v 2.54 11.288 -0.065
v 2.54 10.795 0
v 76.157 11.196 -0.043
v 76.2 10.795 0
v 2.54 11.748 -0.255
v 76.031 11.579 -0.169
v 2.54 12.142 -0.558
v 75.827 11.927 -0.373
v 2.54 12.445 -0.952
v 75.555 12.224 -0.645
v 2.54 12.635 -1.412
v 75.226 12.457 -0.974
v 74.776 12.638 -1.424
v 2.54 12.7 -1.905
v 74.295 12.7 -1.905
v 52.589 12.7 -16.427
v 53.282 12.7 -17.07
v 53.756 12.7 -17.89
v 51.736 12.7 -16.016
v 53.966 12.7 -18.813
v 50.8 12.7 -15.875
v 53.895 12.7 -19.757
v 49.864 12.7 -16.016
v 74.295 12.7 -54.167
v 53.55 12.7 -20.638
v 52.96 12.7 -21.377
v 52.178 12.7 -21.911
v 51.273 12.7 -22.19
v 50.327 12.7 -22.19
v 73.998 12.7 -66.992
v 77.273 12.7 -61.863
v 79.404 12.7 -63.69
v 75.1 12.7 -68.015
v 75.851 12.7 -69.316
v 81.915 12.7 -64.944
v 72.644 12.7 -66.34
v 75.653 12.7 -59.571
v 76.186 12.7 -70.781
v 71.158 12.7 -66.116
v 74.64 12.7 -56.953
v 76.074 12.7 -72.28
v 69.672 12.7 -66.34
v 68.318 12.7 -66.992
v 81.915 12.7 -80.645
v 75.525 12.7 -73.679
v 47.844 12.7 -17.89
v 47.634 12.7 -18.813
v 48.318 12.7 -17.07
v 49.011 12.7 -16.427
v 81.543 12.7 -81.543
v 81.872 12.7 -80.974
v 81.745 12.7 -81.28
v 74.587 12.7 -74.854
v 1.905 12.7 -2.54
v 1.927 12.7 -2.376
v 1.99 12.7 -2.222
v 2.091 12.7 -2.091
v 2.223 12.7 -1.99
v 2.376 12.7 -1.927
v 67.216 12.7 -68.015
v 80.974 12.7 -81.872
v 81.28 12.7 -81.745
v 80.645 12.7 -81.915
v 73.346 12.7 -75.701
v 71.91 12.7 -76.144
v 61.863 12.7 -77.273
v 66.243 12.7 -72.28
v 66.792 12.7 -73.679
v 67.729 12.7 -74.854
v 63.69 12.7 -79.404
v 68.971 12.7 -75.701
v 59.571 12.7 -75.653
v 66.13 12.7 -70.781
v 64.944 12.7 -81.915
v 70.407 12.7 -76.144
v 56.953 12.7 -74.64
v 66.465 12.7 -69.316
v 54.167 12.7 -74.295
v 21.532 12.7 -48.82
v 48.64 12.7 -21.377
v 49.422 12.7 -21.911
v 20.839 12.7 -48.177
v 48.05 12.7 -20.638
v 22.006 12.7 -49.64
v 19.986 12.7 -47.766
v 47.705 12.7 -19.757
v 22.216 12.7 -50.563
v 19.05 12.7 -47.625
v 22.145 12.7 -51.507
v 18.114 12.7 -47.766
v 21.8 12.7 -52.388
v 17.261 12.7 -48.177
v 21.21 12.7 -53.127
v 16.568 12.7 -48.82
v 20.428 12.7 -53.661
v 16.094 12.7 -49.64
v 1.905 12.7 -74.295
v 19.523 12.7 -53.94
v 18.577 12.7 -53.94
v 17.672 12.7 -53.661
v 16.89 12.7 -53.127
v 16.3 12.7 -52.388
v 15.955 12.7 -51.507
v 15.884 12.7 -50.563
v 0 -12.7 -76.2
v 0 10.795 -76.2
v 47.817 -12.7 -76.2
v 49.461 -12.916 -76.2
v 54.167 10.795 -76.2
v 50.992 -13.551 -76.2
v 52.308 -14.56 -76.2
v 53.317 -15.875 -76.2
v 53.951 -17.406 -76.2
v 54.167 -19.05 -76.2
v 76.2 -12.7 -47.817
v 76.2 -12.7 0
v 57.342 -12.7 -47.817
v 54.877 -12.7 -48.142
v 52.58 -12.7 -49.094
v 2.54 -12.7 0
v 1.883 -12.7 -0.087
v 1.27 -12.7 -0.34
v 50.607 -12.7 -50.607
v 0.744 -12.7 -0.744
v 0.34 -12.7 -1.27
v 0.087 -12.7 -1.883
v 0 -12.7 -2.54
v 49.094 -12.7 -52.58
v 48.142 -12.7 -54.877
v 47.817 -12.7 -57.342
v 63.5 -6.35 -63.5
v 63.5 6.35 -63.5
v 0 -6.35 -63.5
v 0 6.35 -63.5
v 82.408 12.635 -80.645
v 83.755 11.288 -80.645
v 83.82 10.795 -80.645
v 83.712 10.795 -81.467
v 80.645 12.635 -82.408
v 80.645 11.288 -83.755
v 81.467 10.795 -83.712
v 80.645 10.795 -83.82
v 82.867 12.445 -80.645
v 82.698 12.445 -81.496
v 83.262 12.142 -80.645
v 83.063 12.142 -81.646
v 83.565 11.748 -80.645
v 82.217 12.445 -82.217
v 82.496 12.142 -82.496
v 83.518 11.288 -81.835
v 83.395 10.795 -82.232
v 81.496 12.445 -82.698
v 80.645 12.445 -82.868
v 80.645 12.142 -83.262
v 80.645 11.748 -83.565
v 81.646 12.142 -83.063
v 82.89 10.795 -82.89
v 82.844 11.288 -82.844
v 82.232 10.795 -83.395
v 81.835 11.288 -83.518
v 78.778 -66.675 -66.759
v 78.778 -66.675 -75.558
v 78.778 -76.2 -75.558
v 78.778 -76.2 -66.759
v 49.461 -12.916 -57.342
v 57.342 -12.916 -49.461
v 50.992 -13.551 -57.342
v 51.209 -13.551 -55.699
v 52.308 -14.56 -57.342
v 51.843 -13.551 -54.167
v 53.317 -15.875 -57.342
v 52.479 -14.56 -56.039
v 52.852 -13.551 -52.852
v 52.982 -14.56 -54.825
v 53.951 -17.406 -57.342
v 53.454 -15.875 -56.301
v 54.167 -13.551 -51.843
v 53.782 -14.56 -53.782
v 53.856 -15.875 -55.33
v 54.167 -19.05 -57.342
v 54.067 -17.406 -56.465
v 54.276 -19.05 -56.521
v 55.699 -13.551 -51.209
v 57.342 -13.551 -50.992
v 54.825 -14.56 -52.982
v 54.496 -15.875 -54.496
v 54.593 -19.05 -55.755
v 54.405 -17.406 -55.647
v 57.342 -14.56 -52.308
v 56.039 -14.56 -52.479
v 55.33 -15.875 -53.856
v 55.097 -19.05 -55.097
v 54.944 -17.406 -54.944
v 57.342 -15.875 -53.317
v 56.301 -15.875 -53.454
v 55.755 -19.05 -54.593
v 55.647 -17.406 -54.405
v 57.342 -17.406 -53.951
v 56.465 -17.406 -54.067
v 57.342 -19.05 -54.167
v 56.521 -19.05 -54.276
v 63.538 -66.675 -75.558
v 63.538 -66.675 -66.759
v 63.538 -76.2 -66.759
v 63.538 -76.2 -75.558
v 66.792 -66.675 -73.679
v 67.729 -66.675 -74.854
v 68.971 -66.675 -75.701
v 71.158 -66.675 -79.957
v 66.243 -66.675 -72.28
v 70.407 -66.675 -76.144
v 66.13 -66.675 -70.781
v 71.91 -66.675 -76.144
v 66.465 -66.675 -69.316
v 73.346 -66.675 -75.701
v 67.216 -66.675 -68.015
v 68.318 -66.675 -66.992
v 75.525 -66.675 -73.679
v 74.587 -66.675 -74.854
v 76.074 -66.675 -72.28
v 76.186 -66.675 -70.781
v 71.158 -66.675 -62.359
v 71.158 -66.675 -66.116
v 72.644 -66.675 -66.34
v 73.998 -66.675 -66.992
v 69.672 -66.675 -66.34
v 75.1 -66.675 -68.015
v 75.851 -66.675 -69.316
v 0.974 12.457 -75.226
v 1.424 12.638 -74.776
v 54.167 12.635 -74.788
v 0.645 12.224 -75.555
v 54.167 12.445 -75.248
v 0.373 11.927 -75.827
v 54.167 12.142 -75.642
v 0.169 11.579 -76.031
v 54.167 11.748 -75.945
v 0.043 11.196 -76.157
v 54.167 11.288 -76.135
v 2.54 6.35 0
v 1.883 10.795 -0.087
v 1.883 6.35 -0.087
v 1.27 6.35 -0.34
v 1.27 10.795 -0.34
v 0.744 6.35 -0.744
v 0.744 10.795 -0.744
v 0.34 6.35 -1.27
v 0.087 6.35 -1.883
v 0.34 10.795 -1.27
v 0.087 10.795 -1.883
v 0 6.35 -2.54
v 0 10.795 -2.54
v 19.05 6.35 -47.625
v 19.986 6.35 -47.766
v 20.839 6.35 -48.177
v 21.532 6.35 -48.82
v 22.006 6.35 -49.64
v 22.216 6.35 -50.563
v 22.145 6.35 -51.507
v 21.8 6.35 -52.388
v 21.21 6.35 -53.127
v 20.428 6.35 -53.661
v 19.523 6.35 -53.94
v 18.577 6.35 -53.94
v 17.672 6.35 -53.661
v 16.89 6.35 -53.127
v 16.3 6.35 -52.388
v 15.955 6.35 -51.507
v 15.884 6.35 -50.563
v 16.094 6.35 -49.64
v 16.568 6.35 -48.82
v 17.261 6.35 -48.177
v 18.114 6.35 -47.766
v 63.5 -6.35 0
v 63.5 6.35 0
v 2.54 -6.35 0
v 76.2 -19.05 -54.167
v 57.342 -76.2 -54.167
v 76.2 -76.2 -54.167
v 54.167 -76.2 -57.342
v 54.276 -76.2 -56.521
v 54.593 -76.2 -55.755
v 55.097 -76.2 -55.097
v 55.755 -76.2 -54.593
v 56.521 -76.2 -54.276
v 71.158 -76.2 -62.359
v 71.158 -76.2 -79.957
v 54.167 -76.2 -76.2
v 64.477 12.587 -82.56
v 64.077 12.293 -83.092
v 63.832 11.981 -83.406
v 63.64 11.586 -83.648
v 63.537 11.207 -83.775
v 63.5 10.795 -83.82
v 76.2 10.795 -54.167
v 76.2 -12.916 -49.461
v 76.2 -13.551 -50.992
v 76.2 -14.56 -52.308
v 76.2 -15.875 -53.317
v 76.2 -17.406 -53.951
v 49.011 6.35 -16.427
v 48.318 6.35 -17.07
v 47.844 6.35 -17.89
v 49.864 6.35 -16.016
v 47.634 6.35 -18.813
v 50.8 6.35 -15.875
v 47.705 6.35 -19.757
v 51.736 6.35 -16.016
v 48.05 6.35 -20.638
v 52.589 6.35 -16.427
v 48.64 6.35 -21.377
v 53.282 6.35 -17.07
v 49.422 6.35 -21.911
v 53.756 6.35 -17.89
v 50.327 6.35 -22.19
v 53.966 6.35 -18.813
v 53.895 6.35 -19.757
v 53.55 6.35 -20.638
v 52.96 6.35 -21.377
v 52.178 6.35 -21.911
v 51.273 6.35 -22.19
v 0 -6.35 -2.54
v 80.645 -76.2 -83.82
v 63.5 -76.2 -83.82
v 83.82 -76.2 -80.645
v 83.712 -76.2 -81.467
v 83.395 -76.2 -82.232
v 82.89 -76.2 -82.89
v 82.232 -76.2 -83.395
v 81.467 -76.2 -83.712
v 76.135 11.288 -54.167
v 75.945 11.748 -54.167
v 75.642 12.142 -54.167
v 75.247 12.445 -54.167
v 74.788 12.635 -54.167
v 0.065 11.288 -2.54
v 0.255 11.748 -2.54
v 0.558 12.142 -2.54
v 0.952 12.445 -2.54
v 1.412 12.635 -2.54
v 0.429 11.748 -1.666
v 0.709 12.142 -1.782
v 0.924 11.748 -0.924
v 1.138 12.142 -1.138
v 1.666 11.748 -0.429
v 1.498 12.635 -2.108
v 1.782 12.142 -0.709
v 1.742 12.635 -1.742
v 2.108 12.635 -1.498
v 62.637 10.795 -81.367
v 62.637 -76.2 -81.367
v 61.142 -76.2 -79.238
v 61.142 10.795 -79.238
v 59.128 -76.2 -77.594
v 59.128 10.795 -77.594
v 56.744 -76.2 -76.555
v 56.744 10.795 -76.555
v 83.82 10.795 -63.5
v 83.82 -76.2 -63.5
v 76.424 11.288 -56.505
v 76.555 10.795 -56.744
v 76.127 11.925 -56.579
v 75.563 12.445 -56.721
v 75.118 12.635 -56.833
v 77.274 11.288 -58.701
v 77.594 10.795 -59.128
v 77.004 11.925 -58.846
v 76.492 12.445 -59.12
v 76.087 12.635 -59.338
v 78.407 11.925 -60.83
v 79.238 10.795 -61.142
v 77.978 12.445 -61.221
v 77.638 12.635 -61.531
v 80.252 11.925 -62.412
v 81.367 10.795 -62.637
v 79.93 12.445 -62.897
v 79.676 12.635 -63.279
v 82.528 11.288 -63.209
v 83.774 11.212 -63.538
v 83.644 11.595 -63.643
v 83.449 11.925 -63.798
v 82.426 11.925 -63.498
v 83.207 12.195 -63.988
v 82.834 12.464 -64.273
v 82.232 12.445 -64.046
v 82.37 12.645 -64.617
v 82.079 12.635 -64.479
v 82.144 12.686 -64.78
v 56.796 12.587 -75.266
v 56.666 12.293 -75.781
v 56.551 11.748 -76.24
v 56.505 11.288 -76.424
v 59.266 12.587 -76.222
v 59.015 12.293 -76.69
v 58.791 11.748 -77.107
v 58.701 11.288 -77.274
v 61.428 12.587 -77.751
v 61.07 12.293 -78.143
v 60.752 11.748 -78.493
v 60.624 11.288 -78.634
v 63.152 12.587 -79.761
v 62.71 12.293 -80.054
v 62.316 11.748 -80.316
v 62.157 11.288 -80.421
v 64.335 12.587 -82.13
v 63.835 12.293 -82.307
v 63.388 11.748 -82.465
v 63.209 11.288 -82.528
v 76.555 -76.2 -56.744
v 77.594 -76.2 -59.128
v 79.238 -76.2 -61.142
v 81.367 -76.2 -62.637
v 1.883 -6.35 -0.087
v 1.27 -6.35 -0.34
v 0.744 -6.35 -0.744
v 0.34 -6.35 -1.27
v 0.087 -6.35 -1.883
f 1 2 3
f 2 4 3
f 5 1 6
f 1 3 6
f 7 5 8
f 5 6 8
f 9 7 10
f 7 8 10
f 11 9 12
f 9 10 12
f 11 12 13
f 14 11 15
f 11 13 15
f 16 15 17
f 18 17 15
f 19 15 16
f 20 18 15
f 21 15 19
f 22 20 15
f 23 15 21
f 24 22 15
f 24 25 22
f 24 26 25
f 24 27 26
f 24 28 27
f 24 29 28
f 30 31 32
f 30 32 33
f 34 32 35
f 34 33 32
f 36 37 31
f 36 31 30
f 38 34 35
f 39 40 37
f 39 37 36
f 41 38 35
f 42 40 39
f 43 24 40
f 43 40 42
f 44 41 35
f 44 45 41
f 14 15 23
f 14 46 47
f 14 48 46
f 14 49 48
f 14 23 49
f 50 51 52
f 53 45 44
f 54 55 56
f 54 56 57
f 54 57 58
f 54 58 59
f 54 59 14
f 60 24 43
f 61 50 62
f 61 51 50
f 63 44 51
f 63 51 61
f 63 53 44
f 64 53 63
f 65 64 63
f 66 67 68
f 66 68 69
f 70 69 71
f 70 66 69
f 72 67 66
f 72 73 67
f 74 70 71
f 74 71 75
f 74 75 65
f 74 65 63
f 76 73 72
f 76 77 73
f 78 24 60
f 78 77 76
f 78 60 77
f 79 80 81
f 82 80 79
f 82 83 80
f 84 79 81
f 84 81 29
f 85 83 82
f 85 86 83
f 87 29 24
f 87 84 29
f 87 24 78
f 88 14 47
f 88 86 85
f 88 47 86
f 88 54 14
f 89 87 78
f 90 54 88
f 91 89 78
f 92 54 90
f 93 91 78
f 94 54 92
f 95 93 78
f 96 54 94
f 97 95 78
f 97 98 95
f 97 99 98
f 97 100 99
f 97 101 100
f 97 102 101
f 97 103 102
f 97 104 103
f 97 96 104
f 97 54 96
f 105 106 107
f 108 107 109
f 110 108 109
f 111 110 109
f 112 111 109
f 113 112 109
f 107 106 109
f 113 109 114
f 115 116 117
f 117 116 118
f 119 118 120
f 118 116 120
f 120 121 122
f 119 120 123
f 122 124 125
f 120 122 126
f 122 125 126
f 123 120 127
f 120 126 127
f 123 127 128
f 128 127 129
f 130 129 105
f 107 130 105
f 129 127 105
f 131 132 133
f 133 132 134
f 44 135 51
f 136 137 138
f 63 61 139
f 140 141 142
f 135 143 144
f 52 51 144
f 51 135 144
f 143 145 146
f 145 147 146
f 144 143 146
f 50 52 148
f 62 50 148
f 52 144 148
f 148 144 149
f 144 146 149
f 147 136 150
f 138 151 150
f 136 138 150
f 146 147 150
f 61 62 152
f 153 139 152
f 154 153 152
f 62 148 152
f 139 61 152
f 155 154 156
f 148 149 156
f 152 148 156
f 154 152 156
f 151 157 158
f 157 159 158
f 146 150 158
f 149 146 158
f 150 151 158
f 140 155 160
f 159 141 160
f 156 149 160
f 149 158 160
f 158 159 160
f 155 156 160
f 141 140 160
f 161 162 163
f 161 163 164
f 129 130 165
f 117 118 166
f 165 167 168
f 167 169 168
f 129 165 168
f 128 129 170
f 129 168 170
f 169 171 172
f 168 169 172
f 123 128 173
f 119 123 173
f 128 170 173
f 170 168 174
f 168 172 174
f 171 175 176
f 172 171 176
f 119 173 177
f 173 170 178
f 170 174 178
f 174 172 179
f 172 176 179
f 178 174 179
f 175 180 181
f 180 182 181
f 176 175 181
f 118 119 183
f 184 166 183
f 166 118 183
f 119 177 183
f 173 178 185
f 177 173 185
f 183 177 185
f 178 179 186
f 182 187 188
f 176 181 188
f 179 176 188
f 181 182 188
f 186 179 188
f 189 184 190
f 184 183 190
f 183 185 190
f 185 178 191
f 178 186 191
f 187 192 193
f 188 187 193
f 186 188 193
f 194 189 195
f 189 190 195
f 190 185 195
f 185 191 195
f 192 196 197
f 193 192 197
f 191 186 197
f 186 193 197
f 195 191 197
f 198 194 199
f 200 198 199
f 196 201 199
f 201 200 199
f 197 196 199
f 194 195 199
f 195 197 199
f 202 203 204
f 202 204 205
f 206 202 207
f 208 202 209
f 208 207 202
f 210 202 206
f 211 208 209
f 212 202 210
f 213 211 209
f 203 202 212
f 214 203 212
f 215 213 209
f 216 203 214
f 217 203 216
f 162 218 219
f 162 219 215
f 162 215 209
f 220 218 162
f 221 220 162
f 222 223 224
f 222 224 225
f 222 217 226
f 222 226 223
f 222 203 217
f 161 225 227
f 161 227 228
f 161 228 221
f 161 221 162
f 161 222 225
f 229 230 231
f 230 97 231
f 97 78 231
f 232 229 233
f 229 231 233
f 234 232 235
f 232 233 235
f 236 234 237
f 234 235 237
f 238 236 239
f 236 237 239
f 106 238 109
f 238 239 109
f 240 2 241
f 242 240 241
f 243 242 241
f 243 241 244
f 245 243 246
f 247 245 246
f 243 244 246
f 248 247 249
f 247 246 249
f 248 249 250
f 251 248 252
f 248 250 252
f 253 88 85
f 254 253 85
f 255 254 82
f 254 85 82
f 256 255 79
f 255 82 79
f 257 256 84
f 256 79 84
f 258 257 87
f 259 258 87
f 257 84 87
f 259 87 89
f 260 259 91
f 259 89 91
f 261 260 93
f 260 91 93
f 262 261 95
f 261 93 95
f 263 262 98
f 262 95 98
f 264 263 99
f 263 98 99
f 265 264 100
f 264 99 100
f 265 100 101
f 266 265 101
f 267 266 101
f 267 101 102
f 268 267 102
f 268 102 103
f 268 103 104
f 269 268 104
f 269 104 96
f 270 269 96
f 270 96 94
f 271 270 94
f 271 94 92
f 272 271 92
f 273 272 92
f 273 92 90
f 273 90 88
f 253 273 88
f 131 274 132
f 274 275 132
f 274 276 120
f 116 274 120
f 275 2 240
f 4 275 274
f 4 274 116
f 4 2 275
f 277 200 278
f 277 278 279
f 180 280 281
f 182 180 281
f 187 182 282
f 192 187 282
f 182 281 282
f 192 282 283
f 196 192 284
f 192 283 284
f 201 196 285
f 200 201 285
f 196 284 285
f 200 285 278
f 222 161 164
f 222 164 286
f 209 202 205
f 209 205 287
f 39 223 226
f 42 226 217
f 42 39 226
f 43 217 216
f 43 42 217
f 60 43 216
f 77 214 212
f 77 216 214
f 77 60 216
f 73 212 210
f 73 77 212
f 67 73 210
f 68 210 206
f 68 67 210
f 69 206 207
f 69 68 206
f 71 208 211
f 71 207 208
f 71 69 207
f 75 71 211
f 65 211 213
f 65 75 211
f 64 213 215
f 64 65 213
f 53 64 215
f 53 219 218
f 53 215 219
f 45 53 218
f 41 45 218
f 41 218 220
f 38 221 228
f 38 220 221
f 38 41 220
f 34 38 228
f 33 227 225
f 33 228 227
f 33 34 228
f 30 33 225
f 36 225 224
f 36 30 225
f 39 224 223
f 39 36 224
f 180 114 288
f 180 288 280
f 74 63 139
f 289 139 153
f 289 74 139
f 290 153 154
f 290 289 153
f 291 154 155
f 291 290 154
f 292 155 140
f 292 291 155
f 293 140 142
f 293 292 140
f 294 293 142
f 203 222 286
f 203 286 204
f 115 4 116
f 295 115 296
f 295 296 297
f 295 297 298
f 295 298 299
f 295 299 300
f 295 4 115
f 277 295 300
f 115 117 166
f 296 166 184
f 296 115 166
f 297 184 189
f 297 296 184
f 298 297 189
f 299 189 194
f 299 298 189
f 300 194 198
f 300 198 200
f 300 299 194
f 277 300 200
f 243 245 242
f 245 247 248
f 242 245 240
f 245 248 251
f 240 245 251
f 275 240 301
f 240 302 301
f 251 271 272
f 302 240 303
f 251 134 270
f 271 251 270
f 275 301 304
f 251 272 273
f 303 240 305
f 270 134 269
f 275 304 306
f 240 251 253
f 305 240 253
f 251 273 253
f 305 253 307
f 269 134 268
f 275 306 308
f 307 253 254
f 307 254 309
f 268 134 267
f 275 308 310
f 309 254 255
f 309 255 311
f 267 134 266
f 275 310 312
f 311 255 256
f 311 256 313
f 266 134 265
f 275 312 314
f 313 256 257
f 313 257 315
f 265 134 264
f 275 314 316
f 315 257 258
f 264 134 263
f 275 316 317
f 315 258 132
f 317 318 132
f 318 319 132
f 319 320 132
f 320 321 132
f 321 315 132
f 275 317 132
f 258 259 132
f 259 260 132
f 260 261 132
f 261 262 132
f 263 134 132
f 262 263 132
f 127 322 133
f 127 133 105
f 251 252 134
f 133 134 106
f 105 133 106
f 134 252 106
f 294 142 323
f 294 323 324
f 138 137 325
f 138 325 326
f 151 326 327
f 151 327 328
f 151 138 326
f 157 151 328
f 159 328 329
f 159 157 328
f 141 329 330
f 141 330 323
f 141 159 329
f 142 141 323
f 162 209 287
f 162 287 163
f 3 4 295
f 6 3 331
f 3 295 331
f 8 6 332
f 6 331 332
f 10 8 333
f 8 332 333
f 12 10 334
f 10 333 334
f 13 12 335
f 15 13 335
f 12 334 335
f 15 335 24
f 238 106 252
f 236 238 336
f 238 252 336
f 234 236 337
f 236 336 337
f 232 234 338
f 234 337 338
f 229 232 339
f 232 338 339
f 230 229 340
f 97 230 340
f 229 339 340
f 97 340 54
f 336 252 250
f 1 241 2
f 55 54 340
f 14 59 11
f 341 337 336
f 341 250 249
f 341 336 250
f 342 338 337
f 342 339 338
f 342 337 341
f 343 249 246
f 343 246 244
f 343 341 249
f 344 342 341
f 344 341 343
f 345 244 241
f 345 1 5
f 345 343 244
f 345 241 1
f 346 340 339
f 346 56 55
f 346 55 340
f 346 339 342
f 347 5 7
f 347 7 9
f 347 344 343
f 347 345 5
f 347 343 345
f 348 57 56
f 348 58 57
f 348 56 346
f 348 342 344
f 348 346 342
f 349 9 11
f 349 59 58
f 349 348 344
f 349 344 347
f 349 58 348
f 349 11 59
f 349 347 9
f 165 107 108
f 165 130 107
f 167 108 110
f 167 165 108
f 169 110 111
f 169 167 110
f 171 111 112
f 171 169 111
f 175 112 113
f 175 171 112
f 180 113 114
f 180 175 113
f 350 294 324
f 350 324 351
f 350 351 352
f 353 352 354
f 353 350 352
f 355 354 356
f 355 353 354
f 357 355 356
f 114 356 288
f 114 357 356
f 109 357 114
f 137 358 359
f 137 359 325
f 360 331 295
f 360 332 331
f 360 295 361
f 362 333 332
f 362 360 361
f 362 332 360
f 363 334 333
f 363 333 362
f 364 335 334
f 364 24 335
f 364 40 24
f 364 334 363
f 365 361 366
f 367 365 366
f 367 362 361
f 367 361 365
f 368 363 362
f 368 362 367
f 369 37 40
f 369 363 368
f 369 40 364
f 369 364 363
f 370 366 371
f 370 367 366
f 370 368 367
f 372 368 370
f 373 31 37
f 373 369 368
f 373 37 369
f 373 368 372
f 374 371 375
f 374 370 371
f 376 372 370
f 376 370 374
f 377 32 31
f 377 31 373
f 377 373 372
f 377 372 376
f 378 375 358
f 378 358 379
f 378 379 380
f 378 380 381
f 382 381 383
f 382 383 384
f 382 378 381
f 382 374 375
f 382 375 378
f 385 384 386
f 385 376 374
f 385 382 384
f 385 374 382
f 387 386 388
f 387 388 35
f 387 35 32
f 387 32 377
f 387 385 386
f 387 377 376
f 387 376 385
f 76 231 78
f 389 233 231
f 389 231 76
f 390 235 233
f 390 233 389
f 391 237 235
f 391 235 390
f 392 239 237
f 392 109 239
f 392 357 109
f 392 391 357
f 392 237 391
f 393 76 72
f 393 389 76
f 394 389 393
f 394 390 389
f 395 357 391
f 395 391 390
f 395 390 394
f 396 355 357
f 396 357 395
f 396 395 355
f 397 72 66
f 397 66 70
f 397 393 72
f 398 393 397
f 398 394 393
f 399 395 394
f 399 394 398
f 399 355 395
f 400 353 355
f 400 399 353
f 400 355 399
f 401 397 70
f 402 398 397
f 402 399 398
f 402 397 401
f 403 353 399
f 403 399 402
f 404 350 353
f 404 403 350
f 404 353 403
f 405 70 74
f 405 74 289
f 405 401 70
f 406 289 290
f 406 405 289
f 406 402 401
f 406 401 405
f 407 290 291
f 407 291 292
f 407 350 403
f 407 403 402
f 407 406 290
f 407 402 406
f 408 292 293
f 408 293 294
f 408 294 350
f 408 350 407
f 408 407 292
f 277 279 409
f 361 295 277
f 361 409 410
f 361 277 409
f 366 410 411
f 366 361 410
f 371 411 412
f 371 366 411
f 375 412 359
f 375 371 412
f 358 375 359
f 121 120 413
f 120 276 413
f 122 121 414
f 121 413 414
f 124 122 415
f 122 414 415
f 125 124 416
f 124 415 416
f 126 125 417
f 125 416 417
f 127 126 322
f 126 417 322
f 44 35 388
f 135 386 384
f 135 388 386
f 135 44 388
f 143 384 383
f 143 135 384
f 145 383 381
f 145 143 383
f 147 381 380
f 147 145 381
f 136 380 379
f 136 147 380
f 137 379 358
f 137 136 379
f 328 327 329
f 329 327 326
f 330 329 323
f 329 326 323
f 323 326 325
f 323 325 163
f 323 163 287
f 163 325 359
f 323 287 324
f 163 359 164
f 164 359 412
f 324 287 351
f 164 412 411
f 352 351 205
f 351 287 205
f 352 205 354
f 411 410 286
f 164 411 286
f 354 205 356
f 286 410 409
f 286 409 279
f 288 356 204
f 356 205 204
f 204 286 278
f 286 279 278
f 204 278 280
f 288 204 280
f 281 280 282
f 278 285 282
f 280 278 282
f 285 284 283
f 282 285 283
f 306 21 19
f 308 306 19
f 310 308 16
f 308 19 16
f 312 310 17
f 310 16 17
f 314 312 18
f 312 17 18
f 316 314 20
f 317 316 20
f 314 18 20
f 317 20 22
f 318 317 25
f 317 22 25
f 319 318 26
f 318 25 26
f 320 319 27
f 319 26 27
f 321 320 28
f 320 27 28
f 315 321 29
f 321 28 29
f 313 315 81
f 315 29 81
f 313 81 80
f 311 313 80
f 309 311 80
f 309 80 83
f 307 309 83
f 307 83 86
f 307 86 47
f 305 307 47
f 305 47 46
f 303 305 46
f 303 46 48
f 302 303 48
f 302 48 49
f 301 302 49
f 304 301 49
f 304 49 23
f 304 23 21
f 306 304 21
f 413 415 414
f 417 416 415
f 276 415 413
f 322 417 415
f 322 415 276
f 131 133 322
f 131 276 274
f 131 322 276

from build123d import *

# Parameters (mm, degrees)
SKETCH1_W               = 76.19999999999999
SKETCH1_H               = 76.2
BOSS_EXTRUDE1_DEPTH     = 12.7
CUT_EXTRUDE1_DEPTH      = 6.35
SKETCH4_W               = 20.320000000000007
SKETCH4_H               = 20.32
SKETCH4_R               = 5.041900000000002
BOSS_EXTRUDE2_DEPTH     = 12.7
CUT_EXTRUDE2_DEPTH      = 120.21776209944557
CUT_EXTRUDE2_DEPTH_BACK = 120.21776209944557
SKETCH4_3_R             = 5.041900000000002
FILLET2_R               = 9.525
FILLET3_R               = 3.175
CUT_EXTRUDE3_REACH      = 123.23
SKETCH5_R               = 3.174999999999997
SKETCH5_R_2             = 3.174999999999998
SKETCH6_R               = 5.041900000000002
BOSS_EXTRUDE3_DEPTH     = 63.5
CUT_EXTRUDE4_DEPTH      = 9.525
FILLET4_R               = 3.175
FILLET5_R               = 6.35
FILLET6_R               = 2.54
FILLET7_R               = 1.9049999999999998


with BuildPart() as part:
    # Sketch1 → Boss-Extrude1 (new, symmetric)
    with BuildSketch(Plane(origin=(0, 0, 0), x_dir=(1, 0, 0), z_dir=(0, 1, 0))):
        with Locations((38.099999999999994, 38.1)):
            Rectangle(SKETCH1_W, SKETCH1_H)
    extrude(amount=BOSS_EXTRUDE1_DEPTH, both=True)

    # Sketch3 → Cut-Extrude1 (cut, symmetric)
    with BuildSketch(Plane(origin=(0, 0, 0), x_dir=(1, 0, 0), z_dir=(0, 1, 0))):
        Polygon((63.499999999999986, 63.5), (-2.082e-14, 63.5), (0, 0), (63.5, 1.7e-16), align=None)
    extrude(amount=CUT_EXTRUDE1_DEPTH, both=True, mode=Mode.SUBTRACT)

    # Sketch4 → Boss-Extrude2 (add, symmetric)
    with BuildSketch(Plane(origin=(0, 0, 0), x_dir=(1, 0, 0), z_dir=(0, 1, 0))):
        with Locations((73.66, 73.66000000000001)):
            Rectangle(SKETCH4_W, SKETCH4_H)
        with Locations((71.15809999999999, 71.1581)):
            Circle(SKETCH4_R, mode=Mode.SUBTRACT)
    extrude(amount=BOSS_EXTRUDE2_DEPTH, both=True)

    # Sketch4<3> → Cut-Extrude2 (cut, two sides: drawn at the far end of the back side and taken through both)
    with BuildSketch(Plane(origin=(0, 0, 0), x_dir=(1, 0, 0), z_dir=(0, 1, 0)).offset(-CUT_EXTRUDE2_DEPTH_BACK)):
        with Locations(Location((71.15809999999999, 71.1581, 0), (0, 0, 270))):
            Circle(SKETCH4_3_R)
    extrude(amount=CUT_EXTRUDE2_DEPTH + CUT_EXTRUDE2_DEPTH_BACK, mode=Mode.SUBTRACT)

    # Fillet2
    # the kernel refuses this fillet: 9.525 mm, written as the material it adds along each edge
    with BuildSketch(Plane(origin=(63.499999999999986, -12.7, -76.2), x_dir=(-1, 0, 0), z_dir=(0, 1, 0))) as fillet2_piece_1:
        with BuildLine():
            CenterArc((9.332555920003912, -9.525000000000006), FILLET2_R, 90, 78.4630409671845)
            Line((0, -7.6200000000000045), (-0.18665111840007853, -7.5819000000000045))
            ThreePointArc((-0.18665111840007853, -7.5819000000000045), (-0.1905000000000001, -3.8100000000000023), (-0.1905000000000001, 0))
            Line((-0.1905000000000001, 0), (0, 0.1905000000000001))
            Line((0, 0.1905000000000001), (9.332555920003912, 0.1905000000000001))
            Line((9.332555920003912, 0.1905000000000001), (9.332555920003912, 0))
        make_face()
    extrude(amount=25.4)
    with BuildSketch(Plane(origin=(76.19999999999999, 12.7, -63.5), x_dir=(0, 0, 1), z_dir=(0, -1, 0))) as fillet2_piece_2:
        with BuildLine():
            CenterArc((9.332555920003905, -9.525000000000006), FILLET2_R, 90, 78.4630409671845)
            Line((0, -7.6200000000000045), (-0.18665111840007853, -7.5819000000000045))
            ThreePointArc((-0.18665111840007853, -7.5819000000000045), (-0.1905000000000001, -3.8100000000000023), (-0.1905000000000001, 0))
            Line((-0.1905000000000001, 0), (0, 0.1905000000000001))
            Line((0, 0.1905000000000001), (9.332555920003905, 0.1905000000000001))
            Line((9.332555920003905, 0.1905000000000001), (9.332555920003905, 0))
        make_face()
    extrude(amount=25.4)

    # Fillet3
    fillet3_edges = [part.edges().sort_by_distance(p)[0] for p in [
        (83.82, 0, -83.82000000000001),
    ]]
    fillet(fillet3_edges, radius=FILLET3_R)

    # Sketch5 → Cut-Extrude3 (cut, up to next)
    with BuildSketch(Plane(origin=(0, 12.7, 0), x_dir=(1, 0, 0), z_dir=(0, 1, 0)), mode=Mode.PRIVATE) as cut_extrude3_sk1:
        with Locations(Location((19.050000000000004, 50.800000000000004, 0), (0, 0, 270))):
            Circle(SKETCH5_R)
    cut_extrude3_tool1 = extrude(cut_extrude3_sk1.sketch, amount=-CUT_EXTRUDE3_REACH, mode=Mode.PRIVATE) & part.part
    # Sketch5 → Cut-Extrude3 (cut, up to next)
    with BuildSketch(Plane(origin=(0, 12.7, 0), x_dir=(1, 0, 0), z_dir=(0, 1, 0)), mode=Mode.PRIVATE) as cut_extrude3_sk2:
        with Locations(Location((50.79999999999999, 19.05, 0), (0, 0, 270))):
            Circle(SKETCH5_R_2)
    cut_extrude3_tool2 = extrude(cut_extrude3_sk2.sketch, amount=-CUT_EXTRUDE3_REACH, mode=Mode.PRIVATE) & part.part
    add(cut_extrude3_tool1.solids().sort_by_distance((19.05, 12.7, -50.8))[0], mode=Mode.SUBTRACT)
    add(cut_extrude3_tool2.solids().sort_by_distance((50.8, 12.7, -19.05))[0], mode=Mode.SUBTRACT)

    # Sketch6 → Boss-Extrude3 (add)
    with BuildSketch(Plane.XZ.offset(12.7)):
        with BuildLine():
            Line((54.16744407999608, -76.2), (54.16744407999608, -54.16744407999608))
            Line((54.16744407999608, -54.16744407999608), (76.19999999999999, -54.16744407999608))
            ThreePointArc((76.19999999999999, -54.16744407999608), (78.34696672547486, -60.191583022616854), (83.82, -63.5))
            Line((83.82, -63.5), (83.82, -80.64500000000001))
            ThreePointArc((83.82, -80.64500000000001), (82.89006403026728, -82.8900640302673), (80.645, -83.82000000000001))
            Line((80.645, -83.82000000000001), (63.499999999999986, -83.82000000000001))
            ThreePointArc((63.499999999999986, -83.82000000000001), (60.19158302261684, -78.34696672547489), (54.16744407999608, -76.2))
        make_face()
        with Locations(Location((71.15809999999999, -71.1581, 0), (0, 0, 90))):
            Circle(SKETCH6_R, mode=Mode.SUBTRACT)
    extrude(amount=BOSS_EXTRUDE3_DEPTH)

    # Sketch7 → Cut-Extrude4 (cut)
    with BuildSketch(Plane.XZ.offset(76.2)):
        Polygon((71.15809999999995, -79.9569181024499), (78.77809999999995, -75.55750905122497), (78.77809999999997, -66.75869094877508), (71.15809999999996, -62.359281897550105), (63.53809999999996, -66.75869094877504), (63.53809999999996, -75.55750905122494), align=None)
    extrude(amount=-CUT_EXTRUDE4_DEPTH, mode=Mode.SUBTRACT)

    # Fillet4
    fillet4_edges = [part.edges().sort_by_distance(p)[0] for p in [
        (54.16744407999608, -44.45, -54.16744407999608),
    ]]
    fillet(fillet4_edges, radius=FILLET4_R)

    # Fillet5
    fillet5_edges = [part.edges().sort_by_distance(p)[0] for p in [
        (66.77122203999804, -12.7, -54.16744407999608),
        (54.16744407999608, -12.7, -66.77122203999804),
        (55.09738004972879, -12.7, -55.09738004972879),
    ]]
    fillet(fillet5_edges, radius=FILLET5_R)

    # Fillet6
    fillet6_edges = [part.edges().sort_by_distance(p)[0] for p in [
        (0, -9.524999999999999, 0),
        (0, 9.524999999999999, 0),
    ]]
    fillet(fillet6_edges, radius=FILLET6_R)

    # Fillet7
    fillet7_edges = [part.edges().sort_by_distance(p)[0] for p in [
        (76.19999999999999, 12.7, -27.083722039998),
        (39.36999999999999, 12.7, 0),
        (0.7439487757861678, 12.7, -0.7439487757861698),
        (83.82, 12.7, -72.0725),
        (72.07249999999999, 12.7, -83.82000000000001),
        (0, 12.7, -39.370000000000005),
        (27.083722039998, 12.7, -76.2),
        (60.191583022616726, 12.7, -78.34696672547484),
        (78.34696672547484, 12.7, -60.191583022616726),
        (82.89006403026728, 12.7, -82.8900640302673),
    ]]
    fillet(fillet7_edges, radius=FILLET7_R)


solid = part.part
